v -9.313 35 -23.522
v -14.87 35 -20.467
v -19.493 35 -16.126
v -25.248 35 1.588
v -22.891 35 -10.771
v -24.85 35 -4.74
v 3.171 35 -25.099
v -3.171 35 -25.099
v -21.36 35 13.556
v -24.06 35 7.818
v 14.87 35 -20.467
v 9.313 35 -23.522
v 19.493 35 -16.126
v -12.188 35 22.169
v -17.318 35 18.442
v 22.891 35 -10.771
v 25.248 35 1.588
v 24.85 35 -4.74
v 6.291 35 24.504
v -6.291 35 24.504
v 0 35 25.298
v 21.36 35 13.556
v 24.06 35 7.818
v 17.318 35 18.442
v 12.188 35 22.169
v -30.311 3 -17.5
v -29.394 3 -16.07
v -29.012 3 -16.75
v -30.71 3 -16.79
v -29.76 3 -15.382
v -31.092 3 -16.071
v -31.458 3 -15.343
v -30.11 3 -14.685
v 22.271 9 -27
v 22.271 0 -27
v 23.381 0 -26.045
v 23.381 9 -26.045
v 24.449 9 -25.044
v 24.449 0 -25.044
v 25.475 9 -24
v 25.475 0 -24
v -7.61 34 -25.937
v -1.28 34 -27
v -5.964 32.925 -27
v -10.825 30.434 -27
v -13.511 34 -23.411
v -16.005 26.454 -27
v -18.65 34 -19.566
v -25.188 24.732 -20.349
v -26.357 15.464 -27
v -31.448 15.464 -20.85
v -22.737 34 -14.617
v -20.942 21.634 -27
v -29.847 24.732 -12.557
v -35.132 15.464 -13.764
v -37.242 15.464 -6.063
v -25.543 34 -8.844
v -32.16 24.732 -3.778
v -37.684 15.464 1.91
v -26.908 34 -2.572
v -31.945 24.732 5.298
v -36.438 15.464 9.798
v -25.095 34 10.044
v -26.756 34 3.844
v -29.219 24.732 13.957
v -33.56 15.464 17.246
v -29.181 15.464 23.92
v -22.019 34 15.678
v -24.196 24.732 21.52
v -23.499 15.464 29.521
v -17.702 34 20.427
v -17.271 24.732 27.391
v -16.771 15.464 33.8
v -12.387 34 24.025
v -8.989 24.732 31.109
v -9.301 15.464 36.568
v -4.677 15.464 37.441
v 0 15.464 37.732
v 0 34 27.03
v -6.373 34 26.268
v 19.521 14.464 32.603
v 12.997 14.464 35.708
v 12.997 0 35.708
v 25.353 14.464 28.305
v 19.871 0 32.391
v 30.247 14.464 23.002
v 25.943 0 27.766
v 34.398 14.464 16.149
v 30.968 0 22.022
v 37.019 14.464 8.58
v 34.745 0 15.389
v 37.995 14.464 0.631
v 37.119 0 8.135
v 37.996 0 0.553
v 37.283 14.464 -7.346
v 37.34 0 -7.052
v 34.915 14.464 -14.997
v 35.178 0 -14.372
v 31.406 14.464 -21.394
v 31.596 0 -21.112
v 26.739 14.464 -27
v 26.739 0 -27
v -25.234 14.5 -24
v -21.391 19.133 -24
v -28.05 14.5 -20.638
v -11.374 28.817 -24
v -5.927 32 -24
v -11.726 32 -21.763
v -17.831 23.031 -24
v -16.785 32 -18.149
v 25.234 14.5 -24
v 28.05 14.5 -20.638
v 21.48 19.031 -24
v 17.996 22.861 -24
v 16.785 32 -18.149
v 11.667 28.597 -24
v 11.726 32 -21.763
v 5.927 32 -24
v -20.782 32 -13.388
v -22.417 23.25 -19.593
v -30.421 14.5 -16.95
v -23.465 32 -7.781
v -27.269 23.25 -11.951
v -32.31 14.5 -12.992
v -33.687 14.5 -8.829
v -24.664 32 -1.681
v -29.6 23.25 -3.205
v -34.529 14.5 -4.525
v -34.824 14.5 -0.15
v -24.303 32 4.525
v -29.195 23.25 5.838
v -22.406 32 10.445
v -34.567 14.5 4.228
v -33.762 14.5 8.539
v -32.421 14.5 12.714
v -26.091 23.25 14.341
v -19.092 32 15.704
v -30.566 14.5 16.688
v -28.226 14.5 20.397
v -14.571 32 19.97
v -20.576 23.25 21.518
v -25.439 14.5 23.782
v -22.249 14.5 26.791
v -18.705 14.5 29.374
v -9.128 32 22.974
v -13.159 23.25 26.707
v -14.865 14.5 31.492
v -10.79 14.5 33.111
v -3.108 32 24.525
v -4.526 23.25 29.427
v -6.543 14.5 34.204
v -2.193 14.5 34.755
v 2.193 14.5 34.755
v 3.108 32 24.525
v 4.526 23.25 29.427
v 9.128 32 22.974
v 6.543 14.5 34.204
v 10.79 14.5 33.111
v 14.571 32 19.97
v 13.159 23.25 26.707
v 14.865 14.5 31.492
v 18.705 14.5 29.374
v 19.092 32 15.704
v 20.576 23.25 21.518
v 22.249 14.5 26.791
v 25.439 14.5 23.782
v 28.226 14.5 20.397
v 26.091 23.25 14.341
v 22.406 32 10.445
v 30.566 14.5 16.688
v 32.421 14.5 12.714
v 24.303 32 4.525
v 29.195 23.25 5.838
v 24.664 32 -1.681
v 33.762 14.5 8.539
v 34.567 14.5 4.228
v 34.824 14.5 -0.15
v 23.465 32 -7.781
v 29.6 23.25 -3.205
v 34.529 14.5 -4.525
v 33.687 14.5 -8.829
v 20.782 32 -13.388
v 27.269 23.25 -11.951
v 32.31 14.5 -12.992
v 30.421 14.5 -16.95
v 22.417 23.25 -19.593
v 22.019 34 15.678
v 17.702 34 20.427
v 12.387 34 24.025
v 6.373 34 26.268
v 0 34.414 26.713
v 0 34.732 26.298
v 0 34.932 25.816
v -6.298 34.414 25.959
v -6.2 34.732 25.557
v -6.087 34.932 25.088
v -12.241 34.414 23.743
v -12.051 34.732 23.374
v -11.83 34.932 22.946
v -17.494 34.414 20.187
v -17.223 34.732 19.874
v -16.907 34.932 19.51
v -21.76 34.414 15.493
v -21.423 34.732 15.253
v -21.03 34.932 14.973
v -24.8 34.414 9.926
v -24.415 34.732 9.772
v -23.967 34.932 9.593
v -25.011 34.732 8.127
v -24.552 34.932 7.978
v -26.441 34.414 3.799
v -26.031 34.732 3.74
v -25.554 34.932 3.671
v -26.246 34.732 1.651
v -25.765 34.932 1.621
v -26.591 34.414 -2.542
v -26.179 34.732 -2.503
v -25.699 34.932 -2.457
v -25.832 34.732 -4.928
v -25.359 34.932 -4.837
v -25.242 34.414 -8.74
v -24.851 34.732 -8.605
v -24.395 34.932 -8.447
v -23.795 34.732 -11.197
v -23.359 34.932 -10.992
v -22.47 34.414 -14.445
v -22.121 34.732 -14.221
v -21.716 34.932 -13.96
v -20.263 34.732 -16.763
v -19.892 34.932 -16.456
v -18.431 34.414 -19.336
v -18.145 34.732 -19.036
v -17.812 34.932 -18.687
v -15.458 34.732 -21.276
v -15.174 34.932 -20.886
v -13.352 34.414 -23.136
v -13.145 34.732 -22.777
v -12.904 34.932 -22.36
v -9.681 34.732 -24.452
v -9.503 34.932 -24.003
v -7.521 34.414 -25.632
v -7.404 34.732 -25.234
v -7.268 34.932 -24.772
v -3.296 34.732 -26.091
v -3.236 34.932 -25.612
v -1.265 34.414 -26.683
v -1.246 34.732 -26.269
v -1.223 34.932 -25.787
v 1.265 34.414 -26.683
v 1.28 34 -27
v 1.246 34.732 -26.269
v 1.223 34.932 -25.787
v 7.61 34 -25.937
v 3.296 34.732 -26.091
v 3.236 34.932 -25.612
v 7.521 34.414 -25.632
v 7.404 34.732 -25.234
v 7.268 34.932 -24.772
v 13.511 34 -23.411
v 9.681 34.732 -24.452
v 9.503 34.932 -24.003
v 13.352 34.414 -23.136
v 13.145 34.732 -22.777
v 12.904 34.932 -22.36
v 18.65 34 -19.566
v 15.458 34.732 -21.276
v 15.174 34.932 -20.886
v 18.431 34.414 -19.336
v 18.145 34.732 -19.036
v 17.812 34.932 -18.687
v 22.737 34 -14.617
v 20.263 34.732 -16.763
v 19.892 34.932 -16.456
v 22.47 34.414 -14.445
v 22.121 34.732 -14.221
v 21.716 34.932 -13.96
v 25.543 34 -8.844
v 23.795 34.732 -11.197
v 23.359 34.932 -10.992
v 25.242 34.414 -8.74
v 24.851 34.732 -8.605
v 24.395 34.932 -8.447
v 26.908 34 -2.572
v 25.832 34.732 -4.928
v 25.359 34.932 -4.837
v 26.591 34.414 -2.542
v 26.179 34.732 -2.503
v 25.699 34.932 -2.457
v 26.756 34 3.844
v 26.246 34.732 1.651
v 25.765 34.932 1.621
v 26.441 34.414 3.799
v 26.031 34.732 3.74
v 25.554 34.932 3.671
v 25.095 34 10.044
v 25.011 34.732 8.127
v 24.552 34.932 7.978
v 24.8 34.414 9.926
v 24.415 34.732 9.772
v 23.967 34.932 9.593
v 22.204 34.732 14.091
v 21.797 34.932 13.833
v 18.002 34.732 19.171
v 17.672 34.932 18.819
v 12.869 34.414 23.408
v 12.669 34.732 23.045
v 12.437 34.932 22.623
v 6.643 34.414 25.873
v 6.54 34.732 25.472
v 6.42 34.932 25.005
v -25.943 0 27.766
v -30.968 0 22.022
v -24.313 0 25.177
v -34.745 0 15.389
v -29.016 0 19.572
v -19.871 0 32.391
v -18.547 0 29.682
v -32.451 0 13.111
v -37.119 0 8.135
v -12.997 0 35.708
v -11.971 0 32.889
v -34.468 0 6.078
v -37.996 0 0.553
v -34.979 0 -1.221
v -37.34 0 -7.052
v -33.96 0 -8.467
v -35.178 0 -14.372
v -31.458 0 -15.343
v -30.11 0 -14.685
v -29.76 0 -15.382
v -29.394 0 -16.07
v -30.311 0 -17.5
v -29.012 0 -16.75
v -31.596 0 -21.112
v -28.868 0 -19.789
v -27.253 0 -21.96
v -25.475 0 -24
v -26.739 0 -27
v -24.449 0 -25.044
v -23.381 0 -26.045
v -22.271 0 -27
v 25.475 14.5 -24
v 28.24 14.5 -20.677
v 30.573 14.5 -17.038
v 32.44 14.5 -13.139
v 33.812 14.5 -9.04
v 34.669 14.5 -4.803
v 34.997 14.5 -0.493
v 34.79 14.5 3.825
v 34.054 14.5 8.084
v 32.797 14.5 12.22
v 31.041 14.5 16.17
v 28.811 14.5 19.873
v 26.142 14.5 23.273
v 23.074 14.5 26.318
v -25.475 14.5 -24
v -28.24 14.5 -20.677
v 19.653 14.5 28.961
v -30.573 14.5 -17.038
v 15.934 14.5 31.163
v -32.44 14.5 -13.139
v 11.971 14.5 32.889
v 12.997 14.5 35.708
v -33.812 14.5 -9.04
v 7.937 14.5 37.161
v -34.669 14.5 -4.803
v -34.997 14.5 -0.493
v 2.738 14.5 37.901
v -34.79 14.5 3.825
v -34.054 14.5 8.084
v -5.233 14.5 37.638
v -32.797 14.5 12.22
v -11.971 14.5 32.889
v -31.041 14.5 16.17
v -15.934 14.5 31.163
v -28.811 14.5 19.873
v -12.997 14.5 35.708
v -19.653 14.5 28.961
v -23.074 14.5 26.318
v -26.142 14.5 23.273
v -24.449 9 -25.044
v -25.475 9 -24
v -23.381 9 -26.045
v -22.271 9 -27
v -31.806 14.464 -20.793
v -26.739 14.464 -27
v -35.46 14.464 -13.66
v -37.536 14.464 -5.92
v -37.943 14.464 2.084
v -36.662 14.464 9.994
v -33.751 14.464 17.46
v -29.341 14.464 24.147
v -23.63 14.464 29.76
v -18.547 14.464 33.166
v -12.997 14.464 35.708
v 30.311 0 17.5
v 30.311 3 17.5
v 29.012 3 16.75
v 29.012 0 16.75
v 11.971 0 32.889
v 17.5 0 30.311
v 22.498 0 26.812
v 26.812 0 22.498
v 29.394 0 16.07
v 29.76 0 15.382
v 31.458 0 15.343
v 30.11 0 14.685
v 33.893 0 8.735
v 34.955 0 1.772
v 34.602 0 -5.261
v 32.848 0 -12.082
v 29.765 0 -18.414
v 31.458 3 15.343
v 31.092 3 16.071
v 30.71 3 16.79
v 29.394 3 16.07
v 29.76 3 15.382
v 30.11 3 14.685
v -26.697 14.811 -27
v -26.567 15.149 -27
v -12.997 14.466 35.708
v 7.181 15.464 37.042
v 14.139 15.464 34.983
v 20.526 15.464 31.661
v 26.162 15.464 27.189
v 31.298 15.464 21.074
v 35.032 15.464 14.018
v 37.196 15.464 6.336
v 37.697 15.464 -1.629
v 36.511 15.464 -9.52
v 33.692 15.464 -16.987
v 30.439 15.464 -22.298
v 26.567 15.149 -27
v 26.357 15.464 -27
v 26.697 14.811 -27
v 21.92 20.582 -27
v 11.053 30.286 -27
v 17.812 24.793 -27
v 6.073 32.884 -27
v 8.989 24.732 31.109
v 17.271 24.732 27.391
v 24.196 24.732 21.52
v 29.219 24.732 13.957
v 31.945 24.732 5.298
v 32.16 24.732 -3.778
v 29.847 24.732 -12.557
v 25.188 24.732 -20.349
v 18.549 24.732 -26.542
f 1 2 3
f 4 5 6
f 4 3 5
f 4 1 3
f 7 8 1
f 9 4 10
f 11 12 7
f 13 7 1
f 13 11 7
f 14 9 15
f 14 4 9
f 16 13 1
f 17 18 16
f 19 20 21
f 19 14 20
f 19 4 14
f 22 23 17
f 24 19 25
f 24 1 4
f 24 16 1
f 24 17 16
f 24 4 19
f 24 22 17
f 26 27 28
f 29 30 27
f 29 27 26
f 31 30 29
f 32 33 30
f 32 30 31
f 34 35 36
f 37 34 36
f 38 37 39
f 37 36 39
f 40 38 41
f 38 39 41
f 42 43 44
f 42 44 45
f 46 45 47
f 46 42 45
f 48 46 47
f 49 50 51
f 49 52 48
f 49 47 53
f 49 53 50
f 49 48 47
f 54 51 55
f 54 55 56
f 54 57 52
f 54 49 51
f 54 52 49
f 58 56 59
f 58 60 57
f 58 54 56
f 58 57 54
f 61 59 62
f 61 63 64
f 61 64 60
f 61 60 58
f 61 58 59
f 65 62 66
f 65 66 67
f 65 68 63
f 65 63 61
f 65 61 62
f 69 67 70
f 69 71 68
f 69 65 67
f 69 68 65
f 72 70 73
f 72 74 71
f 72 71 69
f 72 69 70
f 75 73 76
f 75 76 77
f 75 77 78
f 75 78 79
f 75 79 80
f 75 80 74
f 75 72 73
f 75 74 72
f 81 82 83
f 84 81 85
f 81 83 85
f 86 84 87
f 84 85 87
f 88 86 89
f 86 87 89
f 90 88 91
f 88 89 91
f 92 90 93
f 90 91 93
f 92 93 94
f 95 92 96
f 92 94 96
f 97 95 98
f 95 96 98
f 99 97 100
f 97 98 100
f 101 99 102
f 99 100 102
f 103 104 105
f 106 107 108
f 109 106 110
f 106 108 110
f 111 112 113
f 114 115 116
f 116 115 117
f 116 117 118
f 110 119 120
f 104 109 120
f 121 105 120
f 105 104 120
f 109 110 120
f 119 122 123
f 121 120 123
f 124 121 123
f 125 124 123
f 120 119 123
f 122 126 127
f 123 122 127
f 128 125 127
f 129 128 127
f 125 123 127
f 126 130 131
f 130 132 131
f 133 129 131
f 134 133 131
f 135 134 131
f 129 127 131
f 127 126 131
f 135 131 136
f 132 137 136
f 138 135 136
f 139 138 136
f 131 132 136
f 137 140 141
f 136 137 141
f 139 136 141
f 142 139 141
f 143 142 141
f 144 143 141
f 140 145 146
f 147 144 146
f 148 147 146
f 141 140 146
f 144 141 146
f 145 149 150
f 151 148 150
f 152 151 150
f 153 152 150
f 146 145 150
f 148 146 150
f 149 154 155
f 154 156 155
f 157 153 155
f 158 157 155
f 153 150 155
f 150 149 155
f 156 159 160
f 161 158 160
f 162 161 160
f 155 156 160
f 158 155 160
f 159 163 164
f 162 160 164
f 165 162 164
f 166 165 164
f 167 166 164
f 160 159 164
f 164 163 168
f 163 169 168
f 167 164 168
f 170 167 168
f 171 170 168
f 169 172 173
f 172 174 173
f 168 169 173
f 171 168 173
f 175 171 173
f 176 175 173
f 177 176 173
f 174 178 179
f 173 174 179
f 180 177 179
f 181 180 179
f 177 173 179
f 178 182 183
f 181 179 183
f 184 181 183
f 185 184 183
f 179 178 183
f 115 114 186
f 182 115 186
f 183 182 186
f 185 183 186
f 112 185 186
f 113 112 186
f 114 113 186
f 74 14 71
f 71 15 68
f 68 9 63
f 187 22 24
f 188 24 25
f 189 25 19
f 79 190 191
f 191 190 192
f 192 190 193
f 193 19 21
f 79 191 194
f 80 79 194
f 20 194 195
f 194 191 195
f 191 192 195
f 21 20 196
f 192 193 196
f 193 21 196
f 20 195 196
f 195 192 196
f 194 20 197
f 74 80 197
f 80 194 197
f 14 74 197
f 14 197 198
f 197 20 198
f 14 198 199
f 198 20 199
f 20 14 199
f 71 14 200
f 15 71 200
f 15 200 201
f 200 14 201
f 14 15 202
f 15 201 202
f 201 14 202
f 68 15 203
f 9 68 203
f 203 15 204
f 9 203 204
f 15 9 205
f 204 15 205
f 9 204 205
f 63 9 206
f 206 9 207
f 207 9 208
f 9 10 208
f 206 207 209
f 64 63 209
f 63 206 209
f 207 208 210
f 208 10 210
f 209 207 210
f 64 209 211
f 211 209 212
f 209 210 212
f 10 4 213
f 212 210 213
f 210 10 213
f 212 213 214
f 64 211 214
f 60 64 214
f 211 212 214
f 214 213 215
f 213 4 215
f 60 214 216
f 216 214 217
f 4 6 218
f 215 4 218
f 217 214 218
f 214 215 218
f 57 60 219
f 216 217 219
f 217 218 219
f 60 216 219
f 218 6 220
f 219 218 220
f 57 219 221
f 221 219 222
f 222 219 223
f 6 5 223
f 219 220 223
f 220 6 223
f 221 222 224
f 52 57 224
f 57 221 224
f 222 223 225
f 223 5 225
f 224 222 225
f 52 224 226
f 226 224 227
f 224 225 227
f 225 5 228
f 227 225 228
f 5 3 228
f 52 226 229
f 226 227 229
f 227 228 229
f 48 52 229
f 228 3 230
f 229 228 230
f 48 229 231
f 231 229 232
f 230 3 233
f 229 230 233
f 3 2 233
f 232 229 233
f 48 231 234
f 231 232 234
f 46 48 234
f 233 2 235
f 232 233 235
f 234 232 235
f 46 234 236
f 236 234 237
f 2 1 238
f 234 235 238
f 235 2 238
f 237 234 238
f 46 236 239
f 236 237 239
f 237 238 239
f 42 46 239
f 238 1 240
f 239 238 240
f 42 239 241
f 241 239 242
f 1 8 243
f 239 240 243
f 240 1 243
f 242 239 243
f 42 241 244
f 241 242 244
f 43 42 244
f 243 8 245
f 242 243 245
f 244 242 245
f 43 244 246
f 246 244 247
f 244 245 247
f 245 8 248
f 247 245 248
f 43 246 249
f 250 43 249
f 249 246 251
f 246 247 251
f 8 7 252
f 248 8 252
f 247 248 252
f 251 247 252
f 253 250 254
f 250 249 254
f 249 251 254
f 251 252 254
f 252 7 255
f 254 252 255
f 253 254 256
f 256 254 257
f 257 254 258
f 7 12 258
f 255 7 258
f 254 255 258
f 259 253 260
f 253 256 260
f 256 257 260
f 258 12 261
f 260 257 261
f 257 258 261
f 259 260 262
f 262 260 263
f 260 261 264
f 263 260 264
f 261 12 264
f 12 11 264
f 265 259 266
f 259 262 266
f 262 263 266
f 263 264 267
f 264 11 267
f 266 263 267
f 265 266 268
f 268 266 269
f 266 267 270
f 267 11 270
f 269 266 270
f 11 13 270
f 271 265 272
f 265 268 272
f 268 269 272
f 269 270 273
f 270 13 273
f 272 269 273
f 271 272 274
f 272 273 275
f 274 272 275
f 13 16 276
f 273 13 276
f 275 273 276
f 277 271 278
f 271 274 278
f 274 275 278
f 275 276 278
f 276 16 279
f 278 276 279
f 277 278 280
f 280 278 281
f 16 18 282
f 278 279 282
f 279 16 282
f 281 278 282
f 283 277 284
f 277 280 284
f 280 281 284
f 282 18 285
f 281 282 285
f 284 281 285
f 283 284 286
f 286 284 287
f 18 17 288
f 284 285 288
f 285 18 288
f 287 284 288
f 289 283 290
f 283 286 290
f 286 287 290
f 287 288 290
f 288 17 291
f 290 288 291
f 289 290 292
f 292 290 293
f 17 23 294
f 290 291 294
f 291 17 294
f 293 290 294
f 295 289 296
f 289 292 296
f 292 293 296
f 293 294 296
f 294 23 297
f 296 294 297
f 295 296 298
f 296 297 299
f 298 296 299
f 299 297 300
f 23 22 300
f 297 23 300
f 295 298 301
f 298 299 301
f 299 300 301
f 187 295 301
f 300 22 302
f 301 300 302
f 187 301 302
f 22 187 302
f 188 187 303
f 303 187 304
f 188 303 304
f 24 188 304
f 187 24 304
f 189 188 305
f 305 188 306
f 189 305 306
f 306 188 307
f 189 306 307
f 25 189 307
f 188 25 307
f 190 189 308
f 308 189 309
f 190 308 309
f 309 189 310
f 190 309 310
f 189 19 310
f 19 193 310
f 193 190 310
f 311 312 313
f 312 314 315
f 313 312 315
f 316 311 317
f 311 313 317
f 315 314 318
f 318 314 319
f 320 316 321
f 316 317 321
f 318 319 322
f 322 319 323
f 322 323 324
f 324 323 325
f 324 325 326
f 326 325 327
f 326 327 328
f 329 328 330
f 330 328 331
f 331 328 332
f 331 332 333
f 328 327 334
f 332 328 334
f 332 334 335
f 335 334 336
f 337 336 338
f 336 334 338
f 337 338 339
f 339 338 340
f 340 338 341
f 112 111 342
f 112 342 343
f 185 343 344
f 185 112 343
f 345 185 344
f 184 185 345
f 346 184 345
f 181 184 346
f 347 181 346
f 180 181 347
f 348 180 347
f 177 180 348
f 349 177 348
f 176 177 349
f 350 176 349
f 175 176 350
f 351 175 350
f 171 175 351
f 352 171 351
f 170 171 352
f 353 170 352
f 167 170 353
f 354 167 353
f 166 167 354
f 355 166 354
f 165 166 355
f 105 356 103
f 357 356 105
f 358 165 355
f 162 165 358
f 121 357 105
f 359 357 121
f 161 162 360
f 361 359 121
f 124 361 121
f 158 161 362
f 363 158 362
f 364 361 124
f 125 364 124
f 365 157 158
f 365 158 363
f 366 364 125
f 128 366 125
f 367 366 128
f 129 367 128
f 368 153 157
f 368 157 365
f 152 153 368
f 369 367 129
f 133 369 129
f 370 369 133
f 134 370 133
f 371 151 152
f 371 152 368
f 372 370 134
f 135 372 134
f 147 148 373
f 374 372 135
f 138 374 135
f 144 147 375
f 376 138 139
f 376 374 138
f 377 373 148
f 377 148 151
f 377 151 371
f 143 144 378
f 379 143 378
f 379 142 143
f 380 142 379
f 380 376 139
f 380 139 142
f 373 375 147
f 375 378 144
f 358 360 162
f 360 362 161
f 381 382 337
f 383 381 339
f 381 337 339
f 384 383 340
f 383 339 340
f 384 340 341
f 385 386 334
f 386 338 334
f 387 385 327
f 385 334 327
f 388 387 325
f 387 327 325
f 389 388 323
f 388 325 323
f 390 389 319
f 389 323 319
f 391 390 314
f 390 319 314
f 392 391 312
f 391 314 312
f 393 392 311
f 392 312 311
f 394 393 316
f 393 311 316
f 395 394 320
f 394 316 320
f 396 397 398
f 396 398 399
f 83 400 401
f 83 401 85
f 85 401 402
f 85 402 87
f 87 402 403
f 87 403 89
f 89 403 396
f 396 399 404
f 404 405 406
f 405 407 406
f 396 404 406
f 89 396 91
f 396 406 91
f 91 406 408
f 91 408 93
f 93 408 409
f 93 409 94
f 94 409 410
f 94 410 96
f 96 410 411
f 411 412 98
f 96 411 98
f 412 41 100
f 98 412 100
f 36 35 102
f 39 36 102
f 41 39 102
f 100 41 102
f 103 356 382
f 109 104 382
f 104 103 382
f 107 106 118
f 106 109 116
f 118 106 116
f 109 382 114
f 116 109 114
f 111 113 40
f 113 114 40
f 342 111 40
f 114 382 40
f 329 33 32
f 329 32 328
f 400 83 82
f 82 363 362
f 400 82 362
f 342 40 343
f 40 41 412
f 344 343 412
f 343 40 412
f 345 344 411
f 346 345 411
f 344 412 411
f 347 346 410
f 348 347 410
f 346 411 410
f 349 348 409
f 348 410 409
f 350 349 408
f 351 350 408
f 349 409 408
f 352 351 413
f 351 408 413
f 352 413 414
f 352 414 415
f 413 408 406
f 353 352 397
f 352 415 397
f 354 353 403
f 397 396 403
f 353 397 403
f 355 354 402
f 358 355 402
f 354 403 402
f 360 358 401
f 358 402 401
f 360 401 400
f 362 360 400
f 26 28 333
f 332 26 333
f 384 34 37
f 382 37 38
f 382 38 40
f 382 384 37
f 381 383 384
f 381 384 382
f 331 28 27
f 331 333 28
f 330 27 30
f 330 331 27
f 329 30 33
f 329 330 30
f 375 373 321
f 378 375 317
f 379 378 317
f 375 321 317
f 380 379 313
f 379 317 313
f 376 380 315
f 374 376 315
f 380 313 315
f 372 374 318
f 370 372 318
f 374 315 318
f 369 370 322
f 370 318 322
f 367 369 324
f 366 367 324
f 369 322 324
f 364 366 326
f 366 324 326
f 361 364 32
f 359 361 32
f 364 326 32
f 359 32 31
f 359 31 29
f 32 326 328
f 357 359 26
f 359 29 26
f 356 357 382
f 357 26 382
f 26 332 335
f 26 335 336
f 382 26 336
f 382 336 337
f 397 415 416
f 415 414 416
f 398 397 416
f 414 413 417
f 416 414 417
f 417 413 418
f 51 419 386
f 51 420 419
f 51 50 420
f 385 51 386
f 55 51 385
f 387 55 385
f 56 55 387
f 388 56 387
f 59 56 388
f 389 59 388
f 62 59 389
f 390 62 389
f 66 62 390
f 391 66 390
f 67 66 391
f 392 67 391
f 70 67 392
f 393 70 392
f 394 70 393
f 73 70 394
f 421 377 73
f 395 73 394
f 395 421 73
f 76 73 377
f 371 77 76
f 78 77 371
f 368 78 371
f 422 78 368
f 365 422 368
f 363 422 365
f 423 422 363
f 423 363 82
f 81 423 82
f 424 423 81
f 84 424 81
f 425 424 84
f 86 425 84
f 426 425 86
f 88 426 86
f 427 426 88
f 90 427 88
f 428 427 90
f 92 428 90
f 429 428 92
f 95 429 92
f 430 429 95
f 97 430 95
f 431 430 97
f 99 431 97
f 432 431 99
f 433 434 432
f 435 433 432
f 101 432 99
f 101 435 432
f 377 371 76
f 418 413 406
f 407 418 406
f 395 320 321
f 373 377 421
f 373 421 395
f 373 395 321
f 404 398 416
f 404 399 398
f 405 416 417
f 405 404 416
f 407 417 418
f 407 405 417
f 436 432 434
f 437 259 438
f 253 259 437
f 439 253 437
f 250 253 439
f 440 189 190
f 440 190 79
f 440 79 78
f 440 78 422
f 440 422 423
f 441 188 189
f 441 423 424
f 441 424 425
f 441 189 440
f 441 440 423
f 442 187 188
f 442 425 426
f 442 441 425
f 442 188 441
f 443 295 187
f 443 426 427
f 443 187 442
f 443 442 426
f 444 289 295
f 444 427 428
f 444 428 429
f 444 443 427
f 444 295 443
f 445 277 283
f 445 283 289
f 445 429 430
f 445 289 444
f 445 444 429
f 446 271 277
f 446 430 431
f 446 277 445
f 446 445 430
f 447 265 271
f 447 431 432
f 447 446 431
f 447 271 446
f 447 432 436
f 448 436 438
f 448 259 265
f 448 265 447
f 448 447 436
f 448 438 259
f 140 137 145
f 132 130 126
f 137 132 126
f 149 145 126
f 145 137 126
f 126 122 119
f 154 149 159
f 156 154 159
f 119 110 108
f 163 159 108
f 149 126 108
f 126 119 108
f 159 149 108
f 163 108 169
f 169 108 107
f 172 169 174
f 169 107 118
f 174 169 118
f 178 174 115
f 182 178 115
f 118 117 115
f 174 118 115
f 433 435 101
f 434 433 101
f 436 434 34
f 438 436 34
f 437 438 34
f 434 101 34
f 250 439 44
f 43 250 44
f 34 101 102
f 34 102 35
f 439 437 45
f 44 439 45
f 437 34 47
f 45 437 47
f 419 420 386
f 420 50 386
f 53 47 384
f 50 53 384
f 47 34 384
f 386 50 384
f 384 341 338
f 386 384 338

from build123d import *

# Parameters (mm, degrees)
ESQUISSE1_R                                   = 38
BOSS_EXTRU_1_DEPTH                            = 15
ESQUISSE4_R                                   = 35
ENL_V_MAT_EXTRU_1_DEPTH                       = 14.5
ESQUISSE9_R                                   = 38
BOSS_EXTRU_2_DEPTH                            = 20
BOSS_EXTRU_2_TAPER                            = 30
CONG_1_R                                      = 2
ESQUISSE7_W                                   = 6
ESQUISSE7_H                                   = 14.5
ENL_VEMENT_DE_MATI_RE_R_VOLUTION1_ANGLE       = 20
ENL_VEMENT_DE_MATI_RE_R_VOLUTION1_OTHER_ANGLE = 20
ENL_V_MAT_EXTRU_3_DEPTH                       = 65.132675714
ENL_V_MAT_EXTRU_3_DEPTH_BACK                  = 65.132675714
ESQUISSE10_W                                  = 90
ESQUISSE10_H                                  = 30
BOSS_EXTRU_3_REACH                            = 66.132
ESQUISSE14_W                                  = 3
ESQUISSE14_H                                  = 1.5
R_VOLUTION1_ANGLE                             = 4
ENL_V_MAT_EXTRU_4_DEPTH                       = 9


# Read off the part's stored shape, not the designer's step: Coque1
with BuildPart() as part:
    # Esquisse1 → Boss.-Extru.1 (new body)
    with BuildSketch(Plane(origin=(0, 0, 0), x_dir=(1, 0, 0), z_dir=(0, 1, 0))):
        with Locations(Location((0, 0, 0), (0, 0, 270))):
            Circle(ESQUISSE1_R)
    extrude(amount=BOSS_EXTRU_1_DEPTH)

    # Esquisse4 → Enlèv. mat.-Extru.1 (cut)
    with BuildSketch(Plane.XZ):
        with Locations(Location((0, 0, 0), (0, 0, 270))):
            Circle(ESQUISSE4_R)
    extrude(amount=-ENL_V_MAT_EXTRU_1_DEPTH, mode=Mode.SUBTRACT)

    # Esquisse9 → Boss.-Extru.2 (add)
    with BuildSketch(Plane(origin=(0, 15, 0), x_dir=(1, 0, 0), z_dir=(0, 1, 0))):
        with Locations(Location((0, 0, 0), (0, 0, 270))):
            Circle(ESQUISSE9_R)
    extrude(amount=BOSS_EXTRU_2_DEPTH, taper=BOSS_EXTRU_2_TAPER)

    # Congé1
    cong_1_edges = [part.edges().sort_by_distance(p)[0] for p in [
        (0, 35, -26.452994616),
        (0, 15, -38),
    ]]
    fillet(cong_1_edges, radius=CONG_1_R)

    # Esquisse7 → Enlèvement de matière-Révolution1 (revolve, cut)
    with BuildSketch(Plane(origin=(0, 0, 0), x_dir=(0, 0, -1), z_dir=(1, 0, 0))):
        with Locations((-35, 7.25)):
            Rectangle(ESQUISSE7_W, ESQUISSE7_H)
    revolve(axis=Axis((0, 0, 0), (0, 1, 0)), revolution_arc=ENL_VEMENT_DE_MATI_RE_R_VOLUTION1_ANGLE, mode=Mode.SUBTRACT)

    # Esquisse7 → Enlèvement de matière-Révolution1 other (revolve, cut)
    with BuildSketch(Plane(origin=(0, 0, 0), x_dir=(0, 0, -1), z_dir=(1, 0, 0))):
        with Locations((-35, 7.25)):
            Rectangle(ESQUISSE7_W, ESQUISSE7_H)
    revolve(axis=Axis((0, 0, 0), (0, -1, 0)), revolution_arc=ENL_VEMENT_DE_MATI_RE_R_VOLUTION1_OTHER_ANGLE, mode=Mode.SUBTRACT)

    # Coque1 outline → Coque1 (revolve, cut)
    with BuildSketch(Plane.XY):
        Polygon((34.824573519, 14.5), (24.720943809, 32), (0, 32), (0, 14.5), align=None)
    revolve(axis=Axis((0, 0, 0), (0, 1, 0)), mode=Mode.SUBTRACT)

    # Esquisse10 → Enlèv. mat.-Extru.3 (cut, two sides: drawn at the far end of the back side and taken through both)
    with BuildSketch(Plane(origin=(0, 0, 0), x_dir=(1, 0, 0), z_dir=(0, 1, 0)).offset(-ENL_V_MAT_EXTRU_3_DEPTH_BACK)):
        with Locations((0, 42)):
            Rectangle(ESQUISSE10_W, ESQUISSE10_H)
    extrude(amount=ENL_V_MAT_EXTRU_3_DEPTH + ENL_V_MAT_EXTRU_3_DEPTH_BACK, mode=Mode.SUBTRACT)

    # Esquisse13 → Boss.-Extru.3 (add, up to next)
    with BuildSketch(Plane(origin=(0, 0, 0), x_dir=(1, 0, 0), z_dir=(0, 1, 0)), mode=Mode.PRIVATE) as boss_extru_3_sk1:
        with BuildLine():
            Line((22.271057451, 27), (-22.271057451, 27))
            ThreePointArc((-22.271057451, 27), (-23.920345348, 25.55028529), (-25.475478406, 24))
            Line((-25.475478406, 24), (25.475478406, 24))
            ThreePointArc((25.475478406, 24), (23.920345348, 25.55028529), (22.271057451, 27))
        make_face()
    boss_extru_3_tool1 = extrude(boss_extru_3_sk1.sketch, amount=BOSS_EXTRU_3_REACH, mode=Mode.PRIVATE) - part.part
    add(boss_extru_3_tool1.solids().sort_by_distance((0, 0, -25.466594))[0])

    # Esquisse14 → Révolution1 (revolve)
    with BuildSketch(Plane(origin=(0, 0, 0), x_dir=(0, -1, 0), z_dir=(-0.500000000000001, 0, 0.866025403784438))):
        with Locations((-1.5, 34.25)):
            Rectangle(ESQUISSE14_W, ESQUISSE14_H)
        with Locations((-1.5, -34.25)):
            Rectangle(ESQUISSE14_W, ESQUISSE14_H)
    revolve(axis=Axis((0, 0, 0), (0, 1, 0)), revolution_arc=R_VOLUTION1_ANGLE)

    # Esquisse15 → Enlèv. mat.-Extru.4 (cut)
    with BuildSketch(Plane(origin=(0, 0, 0), x_dir=(1, 0, 0), z_dir=(0, 1, 0))):
        with BuildLine():
            Line((28.722813233, 20), (-28.722813233, 20))
            ThreePointArc((-28.722813233, 20), (0, 35), (28.722813233, 20))
        make_face()
    extrude(amount=ENL_V_MAT_EXTRU_4_DEPTH, mode=Mode.SUBTRACT)


solid = part.part
